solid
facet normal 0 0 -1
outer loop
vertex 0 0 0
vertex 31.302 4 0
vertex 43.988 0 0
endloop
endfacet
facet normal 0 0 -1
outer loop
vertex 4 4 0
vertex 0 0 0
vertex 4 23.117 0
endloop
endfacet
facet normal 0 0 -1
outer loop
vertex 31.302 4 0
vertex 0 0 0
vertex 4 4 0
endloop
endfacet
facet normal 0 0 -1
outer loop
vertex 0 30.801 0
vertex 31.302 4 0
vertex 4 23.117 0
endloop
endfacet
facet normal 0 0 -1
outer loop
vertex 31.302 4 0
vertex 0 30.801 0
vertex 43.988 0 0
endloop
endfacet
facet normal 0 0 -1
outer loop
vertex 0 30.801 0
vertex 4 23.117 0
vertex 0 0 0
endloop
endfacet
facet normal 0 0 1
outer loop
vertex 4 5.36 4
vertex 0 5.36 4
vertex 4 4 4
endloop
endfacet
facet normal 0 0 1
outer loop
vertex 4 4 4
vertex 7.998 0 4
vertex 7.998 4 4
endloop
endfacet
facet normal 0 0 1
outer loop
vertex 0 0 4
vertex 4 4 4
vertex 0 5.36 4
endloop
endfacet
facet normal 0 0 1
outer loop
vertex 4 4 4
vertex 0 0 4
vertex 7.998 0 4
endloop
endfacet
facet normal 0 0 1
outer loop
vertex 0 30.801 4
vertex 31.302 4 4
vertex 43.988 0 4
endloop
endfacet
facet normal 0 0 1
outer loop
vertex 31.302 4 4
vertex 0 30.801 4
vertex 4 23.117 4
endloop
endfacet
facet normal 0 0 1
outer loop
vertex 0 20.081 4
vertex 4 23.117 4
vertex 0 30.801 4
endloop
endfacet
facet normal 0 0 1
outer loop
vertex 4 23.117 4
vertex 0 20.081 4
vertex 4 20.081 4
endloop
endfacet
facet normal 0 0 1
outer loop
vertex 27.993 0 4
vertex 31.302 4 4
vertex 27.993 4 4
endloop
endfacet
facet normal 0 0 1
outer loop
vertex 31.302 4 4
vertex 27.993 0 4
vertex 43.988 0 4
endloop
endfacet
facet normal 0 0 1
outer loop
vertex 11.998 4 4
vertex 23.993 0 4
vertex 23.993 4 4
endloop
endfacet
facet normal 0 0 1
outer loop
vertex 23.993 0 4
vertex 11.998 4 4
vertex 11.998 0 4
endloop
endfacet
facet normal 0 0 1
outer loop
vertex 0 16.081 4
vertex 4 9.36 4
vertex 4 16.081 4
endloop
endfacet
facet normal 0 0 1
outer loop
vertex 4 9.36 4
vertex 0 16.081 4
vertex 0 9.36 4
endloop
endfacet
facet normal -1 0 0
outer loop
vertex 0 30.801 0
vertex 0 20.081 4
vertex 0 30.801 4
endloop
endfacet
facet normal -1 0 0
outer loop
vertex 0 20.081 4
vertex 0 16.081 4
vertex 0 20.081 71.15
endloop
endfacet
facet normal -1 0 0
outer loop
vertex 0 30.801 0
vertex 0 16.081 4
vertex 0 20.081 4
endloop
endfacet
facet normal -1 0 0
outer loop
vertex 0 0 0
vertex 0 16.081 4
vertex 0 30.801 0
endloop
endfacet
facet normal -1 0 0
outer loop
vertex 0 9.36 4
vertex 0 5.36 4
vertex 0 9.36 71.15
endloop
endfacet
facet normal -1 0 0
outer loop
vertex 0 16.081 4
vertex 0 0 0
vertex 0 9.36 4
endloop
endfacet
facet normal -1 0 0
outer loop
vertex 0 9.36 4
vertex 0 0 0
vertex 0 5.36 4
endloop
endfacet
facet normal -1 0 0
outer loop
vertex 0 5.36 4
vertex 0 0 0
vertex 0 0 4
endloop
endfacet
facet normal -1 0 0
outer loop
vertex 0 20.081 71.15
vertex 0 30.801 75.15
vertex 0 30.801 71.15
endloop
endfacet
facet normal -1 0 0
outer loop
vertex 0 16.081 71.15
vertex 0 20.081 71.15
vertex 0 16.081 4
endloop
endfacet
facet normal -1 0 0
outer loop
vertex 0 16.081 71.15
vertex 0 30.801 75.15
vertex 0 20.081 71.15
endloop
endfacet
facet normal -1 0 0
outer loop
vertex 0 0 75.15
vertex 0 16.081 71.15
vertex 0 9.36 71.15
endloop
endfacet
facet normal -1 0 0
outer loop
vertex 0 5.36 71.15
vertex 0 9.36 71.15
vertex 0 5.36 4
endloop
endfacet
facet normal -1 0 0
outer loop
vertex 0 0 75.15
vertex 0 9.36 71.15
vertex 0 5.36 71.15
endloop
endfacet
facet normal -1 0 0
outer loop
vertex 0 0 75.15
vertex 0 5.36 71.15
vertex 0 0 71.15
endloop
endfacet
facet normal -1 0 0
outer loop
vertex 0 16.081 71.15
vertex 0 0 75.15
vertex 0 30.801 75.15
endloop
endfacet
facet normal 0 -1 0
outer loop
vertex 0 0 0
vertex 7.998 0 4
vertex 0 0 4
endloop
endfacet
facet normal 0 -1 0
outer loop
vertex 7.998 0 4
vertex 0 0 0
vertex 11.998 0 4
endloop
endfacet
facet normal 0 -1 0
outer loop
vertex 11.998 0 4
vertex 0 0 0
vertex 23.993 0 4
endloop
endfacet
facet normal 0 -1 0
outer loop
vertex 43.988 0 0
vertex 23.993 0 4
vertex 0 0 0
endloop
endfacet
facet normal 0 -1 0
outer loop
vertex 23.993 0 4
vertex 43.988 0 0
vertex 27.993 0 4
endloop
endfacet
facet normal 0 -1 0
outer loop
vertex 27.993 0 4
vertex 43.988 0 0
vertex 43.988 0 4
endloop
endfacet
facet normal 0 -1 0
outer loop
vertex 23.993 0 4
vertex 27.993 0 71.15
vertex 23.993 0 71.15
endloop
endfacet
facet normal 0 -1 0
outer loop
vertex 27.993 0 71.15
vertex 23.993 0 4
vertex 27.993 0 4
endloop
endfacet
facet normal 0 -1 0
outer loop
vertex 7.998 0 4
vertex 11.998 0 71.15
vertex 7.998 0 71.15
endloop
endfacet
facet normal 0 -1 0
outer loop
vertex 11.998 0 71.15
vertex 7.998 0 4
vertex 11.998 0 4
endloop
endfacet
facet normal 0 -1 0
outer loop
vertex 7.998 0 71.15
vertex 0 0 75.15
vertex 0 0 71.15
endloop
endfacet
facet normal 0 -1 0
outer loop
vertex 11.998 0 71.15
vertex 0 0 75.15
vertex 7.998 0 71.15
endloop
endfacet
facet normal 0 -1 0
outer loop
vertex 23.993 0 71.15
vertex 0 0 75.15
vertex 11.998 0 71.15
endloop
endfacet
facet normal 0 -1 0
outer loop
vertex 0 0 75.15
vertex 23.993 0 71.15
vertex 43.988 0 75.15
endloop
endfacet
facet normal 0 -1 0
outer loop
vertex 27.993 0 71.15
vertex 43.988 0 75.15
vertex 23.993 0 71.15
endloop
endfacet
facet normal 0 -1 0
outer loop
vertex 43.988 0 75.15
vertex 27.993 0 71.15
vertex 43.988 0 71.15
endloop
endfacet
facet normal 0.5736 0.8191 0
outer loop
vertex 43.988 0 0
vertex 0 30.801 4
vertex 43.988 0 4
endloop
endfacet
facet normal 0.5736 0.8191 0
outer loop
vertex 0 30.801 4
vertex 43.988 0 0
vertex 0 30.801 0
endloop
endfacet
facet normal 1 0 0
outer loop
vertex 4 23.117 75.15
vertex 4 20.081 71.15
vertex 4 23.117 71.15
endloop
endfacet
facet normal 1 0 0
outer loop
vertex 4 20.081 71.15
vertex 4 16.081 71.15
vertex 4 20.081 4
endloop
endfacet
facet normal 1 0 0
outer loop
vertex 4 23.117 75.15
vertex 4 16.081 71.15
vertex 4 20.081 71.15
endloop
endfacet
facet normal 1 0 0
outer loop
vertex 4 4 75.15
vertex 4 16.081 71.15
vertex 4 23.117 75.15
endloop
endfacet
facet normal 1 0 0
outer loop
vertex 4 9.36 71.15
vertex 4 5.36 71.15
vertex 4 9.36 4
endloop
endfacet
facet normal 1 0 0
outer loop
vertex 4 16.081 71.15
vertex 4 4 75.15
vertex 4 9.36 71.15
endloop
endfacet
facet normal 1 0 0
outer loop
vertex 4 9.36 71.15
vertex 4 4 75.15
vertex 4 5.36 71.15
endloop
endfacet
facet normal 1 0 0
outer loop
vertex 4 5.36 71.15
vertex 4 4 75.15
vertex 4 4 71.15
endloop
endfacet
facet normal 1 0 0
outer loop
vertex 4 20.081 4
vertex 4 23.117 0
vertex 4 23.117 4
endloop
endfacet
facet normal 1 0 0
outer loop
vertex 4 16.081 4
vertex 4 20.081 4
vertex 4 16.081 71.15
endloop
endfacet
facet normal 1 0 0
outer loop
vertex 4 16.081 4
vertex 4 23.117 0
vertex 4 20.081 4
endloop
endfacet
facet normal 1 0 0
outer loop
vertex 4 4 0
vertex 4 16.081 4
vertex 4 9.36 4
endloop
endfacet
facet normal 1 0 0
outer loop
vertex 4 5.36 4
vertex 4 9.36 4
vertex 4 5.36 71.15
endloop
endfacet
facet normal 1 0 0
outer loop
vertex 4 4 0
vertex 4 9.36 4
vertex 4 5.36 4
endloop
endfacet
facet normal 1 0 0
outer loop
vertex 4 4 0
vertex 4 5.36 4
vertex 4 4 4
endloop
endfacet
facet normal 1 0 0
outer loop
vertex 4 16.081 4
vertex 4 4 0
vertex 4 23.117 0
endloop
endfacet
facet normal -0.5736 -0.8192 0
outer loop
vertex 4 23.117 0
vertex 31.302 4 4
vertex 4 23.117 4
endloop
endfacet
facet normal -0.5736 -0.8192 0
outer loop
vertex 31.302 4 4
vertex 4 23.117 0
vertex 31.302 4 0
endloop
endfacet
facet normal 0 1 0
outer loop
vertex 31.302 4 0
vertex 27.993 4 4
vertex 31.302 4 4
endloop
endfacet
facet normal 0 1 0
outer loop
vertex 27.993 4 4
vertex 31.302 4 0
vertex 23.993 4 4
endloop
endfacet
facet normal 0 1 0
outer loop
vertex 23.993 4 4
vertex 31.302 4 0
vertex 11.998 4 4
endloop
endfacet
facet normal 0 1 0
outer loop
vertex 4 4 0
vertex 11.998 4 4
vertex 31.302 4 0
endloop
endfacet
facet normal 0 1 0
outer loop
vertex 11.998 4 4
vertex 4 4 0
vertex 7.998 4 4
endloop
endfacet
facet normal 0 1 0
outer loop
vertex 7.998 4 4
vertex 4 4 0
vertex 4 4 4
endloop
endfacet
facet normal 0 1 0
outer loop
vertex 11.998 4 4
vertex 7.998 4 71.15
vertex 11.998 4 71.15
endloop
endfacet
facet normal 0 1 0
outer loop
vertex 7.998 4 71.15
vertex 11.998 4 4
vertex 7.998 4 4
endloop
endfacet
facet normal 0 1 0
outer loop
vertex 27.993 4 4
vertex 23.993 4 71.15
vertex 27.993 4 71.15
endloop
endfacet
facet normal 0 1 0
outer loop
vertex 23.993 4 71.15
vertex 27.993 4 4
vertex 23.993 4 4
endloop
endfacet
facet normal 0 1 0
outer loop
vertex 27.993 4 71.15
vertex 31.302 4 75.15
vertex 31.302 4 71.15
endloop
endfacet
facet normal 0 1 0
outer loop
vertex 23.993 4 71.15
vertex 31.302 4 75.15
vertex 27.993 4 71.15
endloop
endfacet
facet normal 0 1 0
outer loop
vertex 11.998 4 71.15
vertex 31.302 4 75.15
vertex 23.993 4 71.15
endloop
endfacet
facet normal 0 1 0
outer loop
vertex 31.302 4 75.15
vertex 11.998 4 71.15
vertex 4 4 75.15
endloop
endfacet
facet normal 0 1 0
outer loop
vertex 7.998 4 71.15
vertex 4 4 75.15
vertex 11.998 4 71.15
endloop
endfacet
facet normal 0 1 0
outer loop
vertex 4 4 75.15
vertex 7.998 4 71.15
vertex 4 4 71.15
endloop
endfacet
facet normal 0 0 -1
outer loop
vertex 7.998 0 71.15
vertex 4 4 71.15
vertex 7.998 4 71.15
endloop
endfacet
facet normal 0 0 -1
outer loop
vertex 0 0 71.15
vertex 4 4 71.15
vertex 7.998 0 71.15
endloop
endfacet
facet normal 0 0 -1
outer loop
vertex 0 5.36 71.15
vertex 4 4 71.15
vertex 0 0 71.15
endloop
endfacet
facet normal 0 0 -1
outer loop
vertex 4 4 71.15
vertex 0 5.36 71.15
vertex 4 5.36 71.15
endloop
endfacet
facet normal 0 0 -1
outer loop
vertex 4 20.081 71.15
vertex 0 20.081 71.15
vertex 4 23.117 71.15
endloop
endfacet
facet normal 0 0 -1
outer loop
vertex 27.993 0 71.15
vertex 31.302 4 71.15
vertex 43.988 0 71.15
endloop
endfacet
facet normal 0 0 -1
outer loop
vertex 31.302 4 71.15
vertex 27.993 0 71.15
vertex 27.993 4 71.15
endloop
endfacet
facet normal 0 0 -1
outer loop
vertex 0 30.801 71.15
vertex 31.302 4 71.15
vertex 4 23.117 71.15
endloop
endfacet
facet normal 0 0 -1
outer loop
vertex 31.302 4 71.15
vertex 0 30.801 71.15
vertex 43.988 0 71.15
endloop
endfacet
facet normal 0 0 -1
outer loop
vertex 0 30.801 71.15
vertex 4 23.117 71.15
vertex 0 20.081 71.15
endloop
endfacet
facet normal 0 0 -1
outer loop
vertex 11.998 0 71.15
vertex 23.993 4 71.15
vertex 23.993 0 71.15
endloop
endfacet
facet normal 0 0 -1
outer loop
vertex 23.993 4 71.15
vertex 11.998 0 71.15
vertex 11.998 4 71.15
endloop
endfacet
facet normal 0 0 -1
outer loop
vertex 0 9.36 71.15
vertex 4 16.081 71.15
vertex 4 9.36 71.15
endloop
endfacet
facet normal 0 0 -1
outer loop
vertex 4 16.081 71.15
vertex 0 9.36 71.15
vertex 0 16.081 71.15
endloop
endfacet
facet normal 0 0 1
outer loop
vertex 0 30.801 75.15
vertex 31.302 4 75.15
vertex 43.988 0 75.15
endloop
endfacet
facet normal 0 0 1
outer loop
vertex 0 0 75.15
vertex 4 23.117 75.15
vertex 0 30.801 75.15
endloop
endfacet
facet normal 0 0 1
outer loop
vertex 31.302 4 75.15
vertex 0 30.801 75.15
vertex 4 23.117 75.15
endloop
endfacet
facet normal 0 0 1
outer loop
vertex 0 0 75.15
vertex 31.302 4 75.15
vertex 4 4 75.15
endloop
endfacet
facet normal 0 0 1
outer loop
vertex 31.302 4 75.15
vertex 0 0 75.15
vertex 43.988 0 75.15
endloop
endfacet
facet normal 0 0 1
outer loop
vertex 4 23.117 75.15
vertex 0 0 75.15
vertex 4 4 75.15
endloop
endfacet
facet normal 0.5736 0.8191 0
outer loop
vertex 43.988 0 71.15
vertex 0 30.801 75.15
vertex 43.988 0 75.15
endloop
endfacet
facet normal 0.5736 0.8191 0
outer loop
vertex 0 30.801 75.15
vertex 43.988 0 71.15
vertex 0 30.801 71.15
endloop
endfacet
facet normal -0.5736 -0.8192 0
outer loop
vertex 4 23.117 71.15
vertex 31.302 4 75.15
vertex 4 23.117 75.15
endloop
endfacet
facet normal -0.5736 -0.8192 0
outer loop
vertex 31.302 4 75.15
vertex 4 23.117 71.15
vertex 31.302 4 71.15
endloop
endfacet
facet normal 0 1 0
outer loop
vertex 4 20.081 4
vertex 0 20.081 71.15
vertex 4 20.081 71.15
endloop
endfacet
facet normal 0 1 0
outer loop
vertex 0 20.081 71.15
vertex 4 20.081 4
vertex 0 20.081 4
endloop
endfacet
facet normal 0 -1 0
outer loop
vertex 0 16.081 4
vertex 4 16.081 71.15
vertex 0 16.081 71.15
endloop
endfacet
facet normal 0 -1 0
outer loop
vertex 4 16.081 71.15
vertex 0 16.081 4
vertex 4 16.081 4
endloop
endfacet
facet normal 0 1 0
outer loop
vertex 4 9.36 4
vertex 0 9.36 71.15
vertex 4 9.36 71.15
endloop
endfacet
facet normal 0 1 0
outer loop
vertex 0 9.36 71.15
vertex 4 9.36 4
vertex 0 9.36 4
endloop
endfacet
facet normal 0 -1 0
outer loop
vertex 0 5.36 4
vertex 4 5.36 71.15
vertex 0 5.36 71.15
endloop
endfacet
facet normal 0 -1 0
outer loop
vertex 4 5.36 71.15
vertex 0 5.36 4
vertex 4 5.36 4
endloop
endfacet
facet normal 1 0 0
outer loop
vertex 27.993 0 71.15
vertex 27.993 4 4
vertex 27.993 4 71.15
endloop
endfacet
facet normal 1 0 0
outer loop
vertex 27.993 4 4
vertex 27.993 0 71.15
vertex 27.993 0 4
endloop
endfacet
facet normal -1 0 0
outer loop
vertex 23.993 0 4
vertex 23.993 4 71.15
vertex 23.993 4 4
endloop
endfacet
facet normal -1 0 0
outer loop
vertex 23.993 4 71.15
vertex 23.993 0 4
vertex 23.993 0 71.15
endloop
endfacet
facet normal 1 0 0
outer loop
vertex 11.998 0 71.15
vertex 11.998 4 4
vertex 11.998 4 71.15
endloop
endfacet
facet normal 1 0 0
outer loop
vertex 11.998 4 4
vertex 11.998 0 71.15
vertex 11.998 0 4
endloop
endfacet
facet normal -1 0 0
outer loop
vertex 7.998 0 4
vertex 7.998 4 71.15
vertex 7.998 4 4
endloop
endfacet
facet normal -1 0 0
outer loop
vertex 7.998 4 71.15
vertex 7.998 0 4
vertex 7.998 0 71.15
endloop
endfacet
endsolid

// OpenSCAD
mainboard_thickness = 1.45;
mainboard_angle = 35;
mainboard_width = 75.15;
mainboard_depth = 53.7;
mount_depth_left = 7.45;
mount_depth_right = 30;
groove_depth = 5.65;
clearance = 2;
platform_wall = 4;
clip_wall = 1.6;

module triangle_bracket(base, height, wall) {
  hypotenuse = sqrt(height * height + base * base);
  scaled_height = height - wall * ((height + hypotenuse) / base);
  scaled_base = base - wall * ((base + hypotenuse) / height);
  linear_extrude(height = wall) {
    difference() {
      polygon([[0, 0], [base, 0], [0, height]]);
      polygon([
        [wall, wall],
        [scaled_base, wall],
        [wall, scaled_height]
      ]);
    }
  }
}

platform_height = mainboard_depth * sin(mainboard_angle);
platform_depth = mainboard_depth * cos(mainboard_angle);

triangle_bracket(platform_depth, platform_height, platform_wall);

translate([0, 0, mainboard_width - platform_wall]) {
  triangle_bracket(platform_depth, platform_height, platform_wall);
}

translate([0, 3 * (platform_height - platform_wall) / 5, 0]) {
  cube([platform_wall, platform_wall, mainboard_width]);
}

translate([0, (platform_height - platform_wall) / 5, 0]) {
  cube([platform_wall, platform_wall, mainboard_width]);
}

translate([3 * (platform_depth - platform_wall) / 5, 0, 0]) {
  cube([platform_wall, platform_wall, mainboard_width]);
}

translate([(platform_depth - platform_wall) / 5, 0, 0]) {
  cube([platform_wall, platform_wall, mainboard_width]);
}
